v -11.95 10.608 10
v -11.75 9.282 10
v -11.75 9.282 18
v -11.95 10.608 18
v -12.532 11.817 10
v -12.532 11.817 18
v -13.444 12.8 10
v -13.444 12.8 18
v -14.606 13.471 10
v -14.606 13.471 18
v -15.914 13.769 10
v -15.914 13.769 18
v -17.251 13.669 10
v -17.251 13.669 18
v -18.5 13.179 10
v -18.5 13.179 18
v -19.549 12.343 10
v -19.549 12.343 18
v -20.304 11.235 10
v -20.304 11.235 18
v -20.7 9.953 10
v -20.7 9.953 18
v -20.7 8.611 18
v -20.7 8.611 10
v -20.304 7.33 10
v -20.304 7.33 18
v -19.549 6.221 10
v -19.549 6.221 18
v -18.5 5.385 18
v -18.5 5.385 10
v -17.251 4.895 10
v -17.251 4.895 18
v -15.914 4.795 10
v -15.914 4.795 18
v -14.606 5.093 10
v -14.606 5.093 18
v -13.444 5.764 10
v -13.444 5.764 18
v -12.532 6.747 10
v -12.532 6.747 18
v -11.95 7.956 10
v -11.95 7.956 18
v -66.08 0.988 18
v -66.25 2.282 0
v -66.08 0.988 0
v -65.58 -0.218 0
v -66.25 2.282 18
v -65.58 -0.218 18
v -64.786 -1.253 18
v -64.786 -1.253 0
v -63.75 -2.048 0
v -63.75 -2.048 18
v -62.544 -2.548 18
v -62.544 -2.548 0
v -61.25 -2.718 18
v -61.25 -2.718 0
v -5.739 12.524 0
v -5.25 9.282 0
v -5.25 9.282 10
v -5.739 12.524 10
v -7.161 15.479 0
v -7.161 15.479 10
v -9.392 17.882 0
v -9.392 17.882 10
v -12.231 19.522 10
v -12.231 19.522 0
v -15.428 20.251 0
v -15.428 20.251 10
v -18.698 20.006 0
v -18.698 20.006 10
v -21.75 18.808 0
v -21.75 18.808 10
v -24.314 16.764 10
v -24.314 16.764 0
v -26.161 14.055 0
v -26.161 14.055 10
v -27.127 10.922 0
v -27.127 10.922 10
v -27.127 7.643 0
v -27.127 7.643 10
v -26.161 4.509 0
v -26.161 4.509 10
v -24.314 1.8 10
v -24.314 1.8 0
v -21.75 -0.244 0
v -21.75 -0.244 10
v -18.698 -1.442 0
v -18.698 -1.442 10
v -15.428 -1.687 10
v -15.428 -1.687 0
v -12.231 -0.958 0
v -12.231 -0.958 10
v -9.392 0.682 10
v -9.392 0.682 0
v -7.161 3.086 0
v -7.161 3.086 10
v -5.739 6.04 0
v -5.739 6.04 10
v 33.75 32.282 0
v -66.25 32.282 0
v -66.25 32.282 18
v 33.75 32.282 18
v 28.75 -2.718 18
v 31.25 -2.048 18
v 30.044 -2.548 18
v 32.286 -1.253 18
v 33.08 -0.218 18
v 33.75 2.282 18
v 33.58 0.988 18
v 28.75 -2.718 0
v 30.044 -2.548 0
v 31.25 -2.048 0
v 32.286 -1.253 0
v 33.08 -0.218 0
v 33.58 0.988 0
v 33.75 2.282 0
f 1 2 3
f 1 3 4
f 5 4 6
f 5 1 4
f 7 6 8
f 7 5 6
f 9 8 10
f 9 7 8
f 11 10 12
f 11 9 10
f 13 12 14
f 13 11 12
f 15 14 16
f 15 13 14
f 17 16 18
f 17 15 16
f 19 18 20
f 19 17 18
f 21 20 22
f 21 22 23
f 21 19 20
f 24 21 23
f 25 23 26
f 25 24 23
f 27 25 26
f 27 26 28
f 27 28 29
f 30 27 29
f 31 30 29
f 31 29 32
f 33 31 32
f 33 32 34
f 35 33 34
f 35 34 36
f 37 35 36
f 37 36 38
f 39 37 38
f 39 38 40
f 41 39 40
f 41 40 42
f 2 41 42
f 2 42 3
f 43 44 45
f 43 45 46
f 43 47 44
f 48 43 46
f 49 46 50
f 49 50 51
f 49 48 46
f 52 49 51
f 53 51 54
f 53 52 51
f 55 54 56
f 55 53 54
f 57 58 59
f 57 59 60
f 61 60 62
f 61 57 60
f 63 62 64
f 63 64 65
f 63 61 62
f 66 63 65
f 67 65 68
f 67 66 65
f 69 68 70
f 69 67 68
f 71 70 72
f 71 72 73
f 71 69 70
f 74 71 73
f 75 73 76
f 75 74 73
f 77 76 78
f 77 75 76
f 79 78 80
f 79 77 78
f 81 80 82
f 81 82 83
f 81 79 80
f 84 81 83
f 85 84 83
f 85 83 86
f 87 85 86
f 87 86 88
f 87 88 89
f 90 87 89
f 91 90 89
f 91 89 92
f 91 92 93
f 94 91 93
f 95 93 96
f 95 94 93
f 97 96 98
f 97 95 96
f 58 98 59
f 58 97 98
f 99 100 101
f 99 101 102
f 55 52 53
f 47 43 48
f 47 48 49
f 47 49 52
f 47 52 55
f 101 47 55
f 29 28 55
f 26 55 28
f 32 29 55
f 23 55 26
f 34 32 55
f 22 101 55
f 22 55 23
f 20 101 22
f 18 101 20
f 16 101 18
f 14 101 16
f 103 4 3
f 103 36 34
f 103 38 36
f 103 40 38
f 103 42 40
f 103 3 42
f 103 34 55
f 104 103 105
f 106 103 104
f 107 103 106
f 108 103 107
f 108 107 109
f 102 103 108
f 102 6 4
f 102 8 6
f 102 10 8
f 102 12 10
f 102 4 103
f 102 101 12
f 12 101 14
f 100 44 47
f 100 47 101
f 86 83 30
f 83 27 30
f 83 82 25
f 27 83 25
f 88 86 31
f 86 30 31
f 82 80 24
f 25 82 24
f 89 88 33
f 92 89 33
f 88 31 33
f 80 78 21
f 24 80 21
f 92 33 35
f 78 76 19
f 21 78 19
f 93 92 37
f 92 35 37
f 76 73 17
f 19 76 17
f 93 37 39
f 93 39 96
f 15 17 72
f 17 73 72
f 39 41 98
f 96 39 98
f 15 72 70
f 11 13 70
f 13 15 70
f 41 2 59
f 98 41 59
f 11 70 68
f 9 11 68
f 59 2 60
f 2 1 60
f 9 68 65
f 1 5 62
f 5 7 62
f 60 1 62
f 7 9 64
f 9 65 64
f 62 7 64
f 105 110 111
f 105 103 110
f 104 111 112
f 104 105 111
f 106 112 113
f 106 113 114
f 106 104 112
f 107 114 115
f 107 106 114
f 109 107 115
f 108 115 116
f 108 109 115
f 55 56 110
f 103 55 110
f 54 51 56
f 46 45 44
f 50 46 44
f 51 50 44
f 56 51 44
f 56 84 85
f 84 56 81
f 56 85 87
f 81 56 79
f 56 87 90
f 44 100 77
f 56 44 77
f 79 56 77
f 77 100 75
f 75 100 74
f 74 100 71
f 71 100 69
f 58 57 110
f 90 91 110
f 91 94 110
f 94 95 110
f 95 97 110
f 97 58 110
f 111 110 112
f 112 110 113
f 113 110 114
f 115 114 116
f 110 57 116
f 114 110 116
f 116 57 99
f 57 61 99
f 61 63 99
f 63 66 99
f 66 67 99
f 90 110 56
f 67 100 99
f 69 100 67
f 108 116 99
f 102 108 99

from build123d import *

# Parameters (mm, degrees)
F0_W     = 100
F0_H     = 35
F0_R     = 11
F0_R_2   = 4.5
F1_DEPTH = 18
F2_DEPTH = 10
F3_R     = 5


with BuildPart() as f1:
    # F0 (on Top) → F1 (new body)
    with BuildSketch(Plane.XY):
        with Locations((-16.250001, 14.782052)):
            Rectangle(F0_W, F0_H)
        with Locations((-16.250001, 9.282052)):
            Circle(F0_R, mode=Mode.SUBTRACT)
        with Locations((-16.250001, 9.282052)):
            Circle(F0_R)
        with Locations((-16.250001, 9.282052)):
            Circle(F0_R_2, mode=Mode.SUBTRACT)
    extrude(amount=F1_DEPTH)

    # F0 (on Top) → F2 (cut)
    with BuildSketch(Plane.XY):
        with Locations((-16.250001, 9.282052)):
            Circle(F0_R)
        with Locations((-16.250001, 9.282052)):
            Circle(F0_R_2, mode=Mode.SUBTRACT)
    extrude(amount=F2_DEPTH, mode=Mode.SUBTRACT)

    # F3
    f3_edges = [f1.edges().sort_by_distance(p)[0] for p in [
        (33.749999, -2.717948, 9),
        (-66.250001, -2.717948, 9),
    ]]
    fillet(f3_edges, radius=F3_R)


solid = f1.part
